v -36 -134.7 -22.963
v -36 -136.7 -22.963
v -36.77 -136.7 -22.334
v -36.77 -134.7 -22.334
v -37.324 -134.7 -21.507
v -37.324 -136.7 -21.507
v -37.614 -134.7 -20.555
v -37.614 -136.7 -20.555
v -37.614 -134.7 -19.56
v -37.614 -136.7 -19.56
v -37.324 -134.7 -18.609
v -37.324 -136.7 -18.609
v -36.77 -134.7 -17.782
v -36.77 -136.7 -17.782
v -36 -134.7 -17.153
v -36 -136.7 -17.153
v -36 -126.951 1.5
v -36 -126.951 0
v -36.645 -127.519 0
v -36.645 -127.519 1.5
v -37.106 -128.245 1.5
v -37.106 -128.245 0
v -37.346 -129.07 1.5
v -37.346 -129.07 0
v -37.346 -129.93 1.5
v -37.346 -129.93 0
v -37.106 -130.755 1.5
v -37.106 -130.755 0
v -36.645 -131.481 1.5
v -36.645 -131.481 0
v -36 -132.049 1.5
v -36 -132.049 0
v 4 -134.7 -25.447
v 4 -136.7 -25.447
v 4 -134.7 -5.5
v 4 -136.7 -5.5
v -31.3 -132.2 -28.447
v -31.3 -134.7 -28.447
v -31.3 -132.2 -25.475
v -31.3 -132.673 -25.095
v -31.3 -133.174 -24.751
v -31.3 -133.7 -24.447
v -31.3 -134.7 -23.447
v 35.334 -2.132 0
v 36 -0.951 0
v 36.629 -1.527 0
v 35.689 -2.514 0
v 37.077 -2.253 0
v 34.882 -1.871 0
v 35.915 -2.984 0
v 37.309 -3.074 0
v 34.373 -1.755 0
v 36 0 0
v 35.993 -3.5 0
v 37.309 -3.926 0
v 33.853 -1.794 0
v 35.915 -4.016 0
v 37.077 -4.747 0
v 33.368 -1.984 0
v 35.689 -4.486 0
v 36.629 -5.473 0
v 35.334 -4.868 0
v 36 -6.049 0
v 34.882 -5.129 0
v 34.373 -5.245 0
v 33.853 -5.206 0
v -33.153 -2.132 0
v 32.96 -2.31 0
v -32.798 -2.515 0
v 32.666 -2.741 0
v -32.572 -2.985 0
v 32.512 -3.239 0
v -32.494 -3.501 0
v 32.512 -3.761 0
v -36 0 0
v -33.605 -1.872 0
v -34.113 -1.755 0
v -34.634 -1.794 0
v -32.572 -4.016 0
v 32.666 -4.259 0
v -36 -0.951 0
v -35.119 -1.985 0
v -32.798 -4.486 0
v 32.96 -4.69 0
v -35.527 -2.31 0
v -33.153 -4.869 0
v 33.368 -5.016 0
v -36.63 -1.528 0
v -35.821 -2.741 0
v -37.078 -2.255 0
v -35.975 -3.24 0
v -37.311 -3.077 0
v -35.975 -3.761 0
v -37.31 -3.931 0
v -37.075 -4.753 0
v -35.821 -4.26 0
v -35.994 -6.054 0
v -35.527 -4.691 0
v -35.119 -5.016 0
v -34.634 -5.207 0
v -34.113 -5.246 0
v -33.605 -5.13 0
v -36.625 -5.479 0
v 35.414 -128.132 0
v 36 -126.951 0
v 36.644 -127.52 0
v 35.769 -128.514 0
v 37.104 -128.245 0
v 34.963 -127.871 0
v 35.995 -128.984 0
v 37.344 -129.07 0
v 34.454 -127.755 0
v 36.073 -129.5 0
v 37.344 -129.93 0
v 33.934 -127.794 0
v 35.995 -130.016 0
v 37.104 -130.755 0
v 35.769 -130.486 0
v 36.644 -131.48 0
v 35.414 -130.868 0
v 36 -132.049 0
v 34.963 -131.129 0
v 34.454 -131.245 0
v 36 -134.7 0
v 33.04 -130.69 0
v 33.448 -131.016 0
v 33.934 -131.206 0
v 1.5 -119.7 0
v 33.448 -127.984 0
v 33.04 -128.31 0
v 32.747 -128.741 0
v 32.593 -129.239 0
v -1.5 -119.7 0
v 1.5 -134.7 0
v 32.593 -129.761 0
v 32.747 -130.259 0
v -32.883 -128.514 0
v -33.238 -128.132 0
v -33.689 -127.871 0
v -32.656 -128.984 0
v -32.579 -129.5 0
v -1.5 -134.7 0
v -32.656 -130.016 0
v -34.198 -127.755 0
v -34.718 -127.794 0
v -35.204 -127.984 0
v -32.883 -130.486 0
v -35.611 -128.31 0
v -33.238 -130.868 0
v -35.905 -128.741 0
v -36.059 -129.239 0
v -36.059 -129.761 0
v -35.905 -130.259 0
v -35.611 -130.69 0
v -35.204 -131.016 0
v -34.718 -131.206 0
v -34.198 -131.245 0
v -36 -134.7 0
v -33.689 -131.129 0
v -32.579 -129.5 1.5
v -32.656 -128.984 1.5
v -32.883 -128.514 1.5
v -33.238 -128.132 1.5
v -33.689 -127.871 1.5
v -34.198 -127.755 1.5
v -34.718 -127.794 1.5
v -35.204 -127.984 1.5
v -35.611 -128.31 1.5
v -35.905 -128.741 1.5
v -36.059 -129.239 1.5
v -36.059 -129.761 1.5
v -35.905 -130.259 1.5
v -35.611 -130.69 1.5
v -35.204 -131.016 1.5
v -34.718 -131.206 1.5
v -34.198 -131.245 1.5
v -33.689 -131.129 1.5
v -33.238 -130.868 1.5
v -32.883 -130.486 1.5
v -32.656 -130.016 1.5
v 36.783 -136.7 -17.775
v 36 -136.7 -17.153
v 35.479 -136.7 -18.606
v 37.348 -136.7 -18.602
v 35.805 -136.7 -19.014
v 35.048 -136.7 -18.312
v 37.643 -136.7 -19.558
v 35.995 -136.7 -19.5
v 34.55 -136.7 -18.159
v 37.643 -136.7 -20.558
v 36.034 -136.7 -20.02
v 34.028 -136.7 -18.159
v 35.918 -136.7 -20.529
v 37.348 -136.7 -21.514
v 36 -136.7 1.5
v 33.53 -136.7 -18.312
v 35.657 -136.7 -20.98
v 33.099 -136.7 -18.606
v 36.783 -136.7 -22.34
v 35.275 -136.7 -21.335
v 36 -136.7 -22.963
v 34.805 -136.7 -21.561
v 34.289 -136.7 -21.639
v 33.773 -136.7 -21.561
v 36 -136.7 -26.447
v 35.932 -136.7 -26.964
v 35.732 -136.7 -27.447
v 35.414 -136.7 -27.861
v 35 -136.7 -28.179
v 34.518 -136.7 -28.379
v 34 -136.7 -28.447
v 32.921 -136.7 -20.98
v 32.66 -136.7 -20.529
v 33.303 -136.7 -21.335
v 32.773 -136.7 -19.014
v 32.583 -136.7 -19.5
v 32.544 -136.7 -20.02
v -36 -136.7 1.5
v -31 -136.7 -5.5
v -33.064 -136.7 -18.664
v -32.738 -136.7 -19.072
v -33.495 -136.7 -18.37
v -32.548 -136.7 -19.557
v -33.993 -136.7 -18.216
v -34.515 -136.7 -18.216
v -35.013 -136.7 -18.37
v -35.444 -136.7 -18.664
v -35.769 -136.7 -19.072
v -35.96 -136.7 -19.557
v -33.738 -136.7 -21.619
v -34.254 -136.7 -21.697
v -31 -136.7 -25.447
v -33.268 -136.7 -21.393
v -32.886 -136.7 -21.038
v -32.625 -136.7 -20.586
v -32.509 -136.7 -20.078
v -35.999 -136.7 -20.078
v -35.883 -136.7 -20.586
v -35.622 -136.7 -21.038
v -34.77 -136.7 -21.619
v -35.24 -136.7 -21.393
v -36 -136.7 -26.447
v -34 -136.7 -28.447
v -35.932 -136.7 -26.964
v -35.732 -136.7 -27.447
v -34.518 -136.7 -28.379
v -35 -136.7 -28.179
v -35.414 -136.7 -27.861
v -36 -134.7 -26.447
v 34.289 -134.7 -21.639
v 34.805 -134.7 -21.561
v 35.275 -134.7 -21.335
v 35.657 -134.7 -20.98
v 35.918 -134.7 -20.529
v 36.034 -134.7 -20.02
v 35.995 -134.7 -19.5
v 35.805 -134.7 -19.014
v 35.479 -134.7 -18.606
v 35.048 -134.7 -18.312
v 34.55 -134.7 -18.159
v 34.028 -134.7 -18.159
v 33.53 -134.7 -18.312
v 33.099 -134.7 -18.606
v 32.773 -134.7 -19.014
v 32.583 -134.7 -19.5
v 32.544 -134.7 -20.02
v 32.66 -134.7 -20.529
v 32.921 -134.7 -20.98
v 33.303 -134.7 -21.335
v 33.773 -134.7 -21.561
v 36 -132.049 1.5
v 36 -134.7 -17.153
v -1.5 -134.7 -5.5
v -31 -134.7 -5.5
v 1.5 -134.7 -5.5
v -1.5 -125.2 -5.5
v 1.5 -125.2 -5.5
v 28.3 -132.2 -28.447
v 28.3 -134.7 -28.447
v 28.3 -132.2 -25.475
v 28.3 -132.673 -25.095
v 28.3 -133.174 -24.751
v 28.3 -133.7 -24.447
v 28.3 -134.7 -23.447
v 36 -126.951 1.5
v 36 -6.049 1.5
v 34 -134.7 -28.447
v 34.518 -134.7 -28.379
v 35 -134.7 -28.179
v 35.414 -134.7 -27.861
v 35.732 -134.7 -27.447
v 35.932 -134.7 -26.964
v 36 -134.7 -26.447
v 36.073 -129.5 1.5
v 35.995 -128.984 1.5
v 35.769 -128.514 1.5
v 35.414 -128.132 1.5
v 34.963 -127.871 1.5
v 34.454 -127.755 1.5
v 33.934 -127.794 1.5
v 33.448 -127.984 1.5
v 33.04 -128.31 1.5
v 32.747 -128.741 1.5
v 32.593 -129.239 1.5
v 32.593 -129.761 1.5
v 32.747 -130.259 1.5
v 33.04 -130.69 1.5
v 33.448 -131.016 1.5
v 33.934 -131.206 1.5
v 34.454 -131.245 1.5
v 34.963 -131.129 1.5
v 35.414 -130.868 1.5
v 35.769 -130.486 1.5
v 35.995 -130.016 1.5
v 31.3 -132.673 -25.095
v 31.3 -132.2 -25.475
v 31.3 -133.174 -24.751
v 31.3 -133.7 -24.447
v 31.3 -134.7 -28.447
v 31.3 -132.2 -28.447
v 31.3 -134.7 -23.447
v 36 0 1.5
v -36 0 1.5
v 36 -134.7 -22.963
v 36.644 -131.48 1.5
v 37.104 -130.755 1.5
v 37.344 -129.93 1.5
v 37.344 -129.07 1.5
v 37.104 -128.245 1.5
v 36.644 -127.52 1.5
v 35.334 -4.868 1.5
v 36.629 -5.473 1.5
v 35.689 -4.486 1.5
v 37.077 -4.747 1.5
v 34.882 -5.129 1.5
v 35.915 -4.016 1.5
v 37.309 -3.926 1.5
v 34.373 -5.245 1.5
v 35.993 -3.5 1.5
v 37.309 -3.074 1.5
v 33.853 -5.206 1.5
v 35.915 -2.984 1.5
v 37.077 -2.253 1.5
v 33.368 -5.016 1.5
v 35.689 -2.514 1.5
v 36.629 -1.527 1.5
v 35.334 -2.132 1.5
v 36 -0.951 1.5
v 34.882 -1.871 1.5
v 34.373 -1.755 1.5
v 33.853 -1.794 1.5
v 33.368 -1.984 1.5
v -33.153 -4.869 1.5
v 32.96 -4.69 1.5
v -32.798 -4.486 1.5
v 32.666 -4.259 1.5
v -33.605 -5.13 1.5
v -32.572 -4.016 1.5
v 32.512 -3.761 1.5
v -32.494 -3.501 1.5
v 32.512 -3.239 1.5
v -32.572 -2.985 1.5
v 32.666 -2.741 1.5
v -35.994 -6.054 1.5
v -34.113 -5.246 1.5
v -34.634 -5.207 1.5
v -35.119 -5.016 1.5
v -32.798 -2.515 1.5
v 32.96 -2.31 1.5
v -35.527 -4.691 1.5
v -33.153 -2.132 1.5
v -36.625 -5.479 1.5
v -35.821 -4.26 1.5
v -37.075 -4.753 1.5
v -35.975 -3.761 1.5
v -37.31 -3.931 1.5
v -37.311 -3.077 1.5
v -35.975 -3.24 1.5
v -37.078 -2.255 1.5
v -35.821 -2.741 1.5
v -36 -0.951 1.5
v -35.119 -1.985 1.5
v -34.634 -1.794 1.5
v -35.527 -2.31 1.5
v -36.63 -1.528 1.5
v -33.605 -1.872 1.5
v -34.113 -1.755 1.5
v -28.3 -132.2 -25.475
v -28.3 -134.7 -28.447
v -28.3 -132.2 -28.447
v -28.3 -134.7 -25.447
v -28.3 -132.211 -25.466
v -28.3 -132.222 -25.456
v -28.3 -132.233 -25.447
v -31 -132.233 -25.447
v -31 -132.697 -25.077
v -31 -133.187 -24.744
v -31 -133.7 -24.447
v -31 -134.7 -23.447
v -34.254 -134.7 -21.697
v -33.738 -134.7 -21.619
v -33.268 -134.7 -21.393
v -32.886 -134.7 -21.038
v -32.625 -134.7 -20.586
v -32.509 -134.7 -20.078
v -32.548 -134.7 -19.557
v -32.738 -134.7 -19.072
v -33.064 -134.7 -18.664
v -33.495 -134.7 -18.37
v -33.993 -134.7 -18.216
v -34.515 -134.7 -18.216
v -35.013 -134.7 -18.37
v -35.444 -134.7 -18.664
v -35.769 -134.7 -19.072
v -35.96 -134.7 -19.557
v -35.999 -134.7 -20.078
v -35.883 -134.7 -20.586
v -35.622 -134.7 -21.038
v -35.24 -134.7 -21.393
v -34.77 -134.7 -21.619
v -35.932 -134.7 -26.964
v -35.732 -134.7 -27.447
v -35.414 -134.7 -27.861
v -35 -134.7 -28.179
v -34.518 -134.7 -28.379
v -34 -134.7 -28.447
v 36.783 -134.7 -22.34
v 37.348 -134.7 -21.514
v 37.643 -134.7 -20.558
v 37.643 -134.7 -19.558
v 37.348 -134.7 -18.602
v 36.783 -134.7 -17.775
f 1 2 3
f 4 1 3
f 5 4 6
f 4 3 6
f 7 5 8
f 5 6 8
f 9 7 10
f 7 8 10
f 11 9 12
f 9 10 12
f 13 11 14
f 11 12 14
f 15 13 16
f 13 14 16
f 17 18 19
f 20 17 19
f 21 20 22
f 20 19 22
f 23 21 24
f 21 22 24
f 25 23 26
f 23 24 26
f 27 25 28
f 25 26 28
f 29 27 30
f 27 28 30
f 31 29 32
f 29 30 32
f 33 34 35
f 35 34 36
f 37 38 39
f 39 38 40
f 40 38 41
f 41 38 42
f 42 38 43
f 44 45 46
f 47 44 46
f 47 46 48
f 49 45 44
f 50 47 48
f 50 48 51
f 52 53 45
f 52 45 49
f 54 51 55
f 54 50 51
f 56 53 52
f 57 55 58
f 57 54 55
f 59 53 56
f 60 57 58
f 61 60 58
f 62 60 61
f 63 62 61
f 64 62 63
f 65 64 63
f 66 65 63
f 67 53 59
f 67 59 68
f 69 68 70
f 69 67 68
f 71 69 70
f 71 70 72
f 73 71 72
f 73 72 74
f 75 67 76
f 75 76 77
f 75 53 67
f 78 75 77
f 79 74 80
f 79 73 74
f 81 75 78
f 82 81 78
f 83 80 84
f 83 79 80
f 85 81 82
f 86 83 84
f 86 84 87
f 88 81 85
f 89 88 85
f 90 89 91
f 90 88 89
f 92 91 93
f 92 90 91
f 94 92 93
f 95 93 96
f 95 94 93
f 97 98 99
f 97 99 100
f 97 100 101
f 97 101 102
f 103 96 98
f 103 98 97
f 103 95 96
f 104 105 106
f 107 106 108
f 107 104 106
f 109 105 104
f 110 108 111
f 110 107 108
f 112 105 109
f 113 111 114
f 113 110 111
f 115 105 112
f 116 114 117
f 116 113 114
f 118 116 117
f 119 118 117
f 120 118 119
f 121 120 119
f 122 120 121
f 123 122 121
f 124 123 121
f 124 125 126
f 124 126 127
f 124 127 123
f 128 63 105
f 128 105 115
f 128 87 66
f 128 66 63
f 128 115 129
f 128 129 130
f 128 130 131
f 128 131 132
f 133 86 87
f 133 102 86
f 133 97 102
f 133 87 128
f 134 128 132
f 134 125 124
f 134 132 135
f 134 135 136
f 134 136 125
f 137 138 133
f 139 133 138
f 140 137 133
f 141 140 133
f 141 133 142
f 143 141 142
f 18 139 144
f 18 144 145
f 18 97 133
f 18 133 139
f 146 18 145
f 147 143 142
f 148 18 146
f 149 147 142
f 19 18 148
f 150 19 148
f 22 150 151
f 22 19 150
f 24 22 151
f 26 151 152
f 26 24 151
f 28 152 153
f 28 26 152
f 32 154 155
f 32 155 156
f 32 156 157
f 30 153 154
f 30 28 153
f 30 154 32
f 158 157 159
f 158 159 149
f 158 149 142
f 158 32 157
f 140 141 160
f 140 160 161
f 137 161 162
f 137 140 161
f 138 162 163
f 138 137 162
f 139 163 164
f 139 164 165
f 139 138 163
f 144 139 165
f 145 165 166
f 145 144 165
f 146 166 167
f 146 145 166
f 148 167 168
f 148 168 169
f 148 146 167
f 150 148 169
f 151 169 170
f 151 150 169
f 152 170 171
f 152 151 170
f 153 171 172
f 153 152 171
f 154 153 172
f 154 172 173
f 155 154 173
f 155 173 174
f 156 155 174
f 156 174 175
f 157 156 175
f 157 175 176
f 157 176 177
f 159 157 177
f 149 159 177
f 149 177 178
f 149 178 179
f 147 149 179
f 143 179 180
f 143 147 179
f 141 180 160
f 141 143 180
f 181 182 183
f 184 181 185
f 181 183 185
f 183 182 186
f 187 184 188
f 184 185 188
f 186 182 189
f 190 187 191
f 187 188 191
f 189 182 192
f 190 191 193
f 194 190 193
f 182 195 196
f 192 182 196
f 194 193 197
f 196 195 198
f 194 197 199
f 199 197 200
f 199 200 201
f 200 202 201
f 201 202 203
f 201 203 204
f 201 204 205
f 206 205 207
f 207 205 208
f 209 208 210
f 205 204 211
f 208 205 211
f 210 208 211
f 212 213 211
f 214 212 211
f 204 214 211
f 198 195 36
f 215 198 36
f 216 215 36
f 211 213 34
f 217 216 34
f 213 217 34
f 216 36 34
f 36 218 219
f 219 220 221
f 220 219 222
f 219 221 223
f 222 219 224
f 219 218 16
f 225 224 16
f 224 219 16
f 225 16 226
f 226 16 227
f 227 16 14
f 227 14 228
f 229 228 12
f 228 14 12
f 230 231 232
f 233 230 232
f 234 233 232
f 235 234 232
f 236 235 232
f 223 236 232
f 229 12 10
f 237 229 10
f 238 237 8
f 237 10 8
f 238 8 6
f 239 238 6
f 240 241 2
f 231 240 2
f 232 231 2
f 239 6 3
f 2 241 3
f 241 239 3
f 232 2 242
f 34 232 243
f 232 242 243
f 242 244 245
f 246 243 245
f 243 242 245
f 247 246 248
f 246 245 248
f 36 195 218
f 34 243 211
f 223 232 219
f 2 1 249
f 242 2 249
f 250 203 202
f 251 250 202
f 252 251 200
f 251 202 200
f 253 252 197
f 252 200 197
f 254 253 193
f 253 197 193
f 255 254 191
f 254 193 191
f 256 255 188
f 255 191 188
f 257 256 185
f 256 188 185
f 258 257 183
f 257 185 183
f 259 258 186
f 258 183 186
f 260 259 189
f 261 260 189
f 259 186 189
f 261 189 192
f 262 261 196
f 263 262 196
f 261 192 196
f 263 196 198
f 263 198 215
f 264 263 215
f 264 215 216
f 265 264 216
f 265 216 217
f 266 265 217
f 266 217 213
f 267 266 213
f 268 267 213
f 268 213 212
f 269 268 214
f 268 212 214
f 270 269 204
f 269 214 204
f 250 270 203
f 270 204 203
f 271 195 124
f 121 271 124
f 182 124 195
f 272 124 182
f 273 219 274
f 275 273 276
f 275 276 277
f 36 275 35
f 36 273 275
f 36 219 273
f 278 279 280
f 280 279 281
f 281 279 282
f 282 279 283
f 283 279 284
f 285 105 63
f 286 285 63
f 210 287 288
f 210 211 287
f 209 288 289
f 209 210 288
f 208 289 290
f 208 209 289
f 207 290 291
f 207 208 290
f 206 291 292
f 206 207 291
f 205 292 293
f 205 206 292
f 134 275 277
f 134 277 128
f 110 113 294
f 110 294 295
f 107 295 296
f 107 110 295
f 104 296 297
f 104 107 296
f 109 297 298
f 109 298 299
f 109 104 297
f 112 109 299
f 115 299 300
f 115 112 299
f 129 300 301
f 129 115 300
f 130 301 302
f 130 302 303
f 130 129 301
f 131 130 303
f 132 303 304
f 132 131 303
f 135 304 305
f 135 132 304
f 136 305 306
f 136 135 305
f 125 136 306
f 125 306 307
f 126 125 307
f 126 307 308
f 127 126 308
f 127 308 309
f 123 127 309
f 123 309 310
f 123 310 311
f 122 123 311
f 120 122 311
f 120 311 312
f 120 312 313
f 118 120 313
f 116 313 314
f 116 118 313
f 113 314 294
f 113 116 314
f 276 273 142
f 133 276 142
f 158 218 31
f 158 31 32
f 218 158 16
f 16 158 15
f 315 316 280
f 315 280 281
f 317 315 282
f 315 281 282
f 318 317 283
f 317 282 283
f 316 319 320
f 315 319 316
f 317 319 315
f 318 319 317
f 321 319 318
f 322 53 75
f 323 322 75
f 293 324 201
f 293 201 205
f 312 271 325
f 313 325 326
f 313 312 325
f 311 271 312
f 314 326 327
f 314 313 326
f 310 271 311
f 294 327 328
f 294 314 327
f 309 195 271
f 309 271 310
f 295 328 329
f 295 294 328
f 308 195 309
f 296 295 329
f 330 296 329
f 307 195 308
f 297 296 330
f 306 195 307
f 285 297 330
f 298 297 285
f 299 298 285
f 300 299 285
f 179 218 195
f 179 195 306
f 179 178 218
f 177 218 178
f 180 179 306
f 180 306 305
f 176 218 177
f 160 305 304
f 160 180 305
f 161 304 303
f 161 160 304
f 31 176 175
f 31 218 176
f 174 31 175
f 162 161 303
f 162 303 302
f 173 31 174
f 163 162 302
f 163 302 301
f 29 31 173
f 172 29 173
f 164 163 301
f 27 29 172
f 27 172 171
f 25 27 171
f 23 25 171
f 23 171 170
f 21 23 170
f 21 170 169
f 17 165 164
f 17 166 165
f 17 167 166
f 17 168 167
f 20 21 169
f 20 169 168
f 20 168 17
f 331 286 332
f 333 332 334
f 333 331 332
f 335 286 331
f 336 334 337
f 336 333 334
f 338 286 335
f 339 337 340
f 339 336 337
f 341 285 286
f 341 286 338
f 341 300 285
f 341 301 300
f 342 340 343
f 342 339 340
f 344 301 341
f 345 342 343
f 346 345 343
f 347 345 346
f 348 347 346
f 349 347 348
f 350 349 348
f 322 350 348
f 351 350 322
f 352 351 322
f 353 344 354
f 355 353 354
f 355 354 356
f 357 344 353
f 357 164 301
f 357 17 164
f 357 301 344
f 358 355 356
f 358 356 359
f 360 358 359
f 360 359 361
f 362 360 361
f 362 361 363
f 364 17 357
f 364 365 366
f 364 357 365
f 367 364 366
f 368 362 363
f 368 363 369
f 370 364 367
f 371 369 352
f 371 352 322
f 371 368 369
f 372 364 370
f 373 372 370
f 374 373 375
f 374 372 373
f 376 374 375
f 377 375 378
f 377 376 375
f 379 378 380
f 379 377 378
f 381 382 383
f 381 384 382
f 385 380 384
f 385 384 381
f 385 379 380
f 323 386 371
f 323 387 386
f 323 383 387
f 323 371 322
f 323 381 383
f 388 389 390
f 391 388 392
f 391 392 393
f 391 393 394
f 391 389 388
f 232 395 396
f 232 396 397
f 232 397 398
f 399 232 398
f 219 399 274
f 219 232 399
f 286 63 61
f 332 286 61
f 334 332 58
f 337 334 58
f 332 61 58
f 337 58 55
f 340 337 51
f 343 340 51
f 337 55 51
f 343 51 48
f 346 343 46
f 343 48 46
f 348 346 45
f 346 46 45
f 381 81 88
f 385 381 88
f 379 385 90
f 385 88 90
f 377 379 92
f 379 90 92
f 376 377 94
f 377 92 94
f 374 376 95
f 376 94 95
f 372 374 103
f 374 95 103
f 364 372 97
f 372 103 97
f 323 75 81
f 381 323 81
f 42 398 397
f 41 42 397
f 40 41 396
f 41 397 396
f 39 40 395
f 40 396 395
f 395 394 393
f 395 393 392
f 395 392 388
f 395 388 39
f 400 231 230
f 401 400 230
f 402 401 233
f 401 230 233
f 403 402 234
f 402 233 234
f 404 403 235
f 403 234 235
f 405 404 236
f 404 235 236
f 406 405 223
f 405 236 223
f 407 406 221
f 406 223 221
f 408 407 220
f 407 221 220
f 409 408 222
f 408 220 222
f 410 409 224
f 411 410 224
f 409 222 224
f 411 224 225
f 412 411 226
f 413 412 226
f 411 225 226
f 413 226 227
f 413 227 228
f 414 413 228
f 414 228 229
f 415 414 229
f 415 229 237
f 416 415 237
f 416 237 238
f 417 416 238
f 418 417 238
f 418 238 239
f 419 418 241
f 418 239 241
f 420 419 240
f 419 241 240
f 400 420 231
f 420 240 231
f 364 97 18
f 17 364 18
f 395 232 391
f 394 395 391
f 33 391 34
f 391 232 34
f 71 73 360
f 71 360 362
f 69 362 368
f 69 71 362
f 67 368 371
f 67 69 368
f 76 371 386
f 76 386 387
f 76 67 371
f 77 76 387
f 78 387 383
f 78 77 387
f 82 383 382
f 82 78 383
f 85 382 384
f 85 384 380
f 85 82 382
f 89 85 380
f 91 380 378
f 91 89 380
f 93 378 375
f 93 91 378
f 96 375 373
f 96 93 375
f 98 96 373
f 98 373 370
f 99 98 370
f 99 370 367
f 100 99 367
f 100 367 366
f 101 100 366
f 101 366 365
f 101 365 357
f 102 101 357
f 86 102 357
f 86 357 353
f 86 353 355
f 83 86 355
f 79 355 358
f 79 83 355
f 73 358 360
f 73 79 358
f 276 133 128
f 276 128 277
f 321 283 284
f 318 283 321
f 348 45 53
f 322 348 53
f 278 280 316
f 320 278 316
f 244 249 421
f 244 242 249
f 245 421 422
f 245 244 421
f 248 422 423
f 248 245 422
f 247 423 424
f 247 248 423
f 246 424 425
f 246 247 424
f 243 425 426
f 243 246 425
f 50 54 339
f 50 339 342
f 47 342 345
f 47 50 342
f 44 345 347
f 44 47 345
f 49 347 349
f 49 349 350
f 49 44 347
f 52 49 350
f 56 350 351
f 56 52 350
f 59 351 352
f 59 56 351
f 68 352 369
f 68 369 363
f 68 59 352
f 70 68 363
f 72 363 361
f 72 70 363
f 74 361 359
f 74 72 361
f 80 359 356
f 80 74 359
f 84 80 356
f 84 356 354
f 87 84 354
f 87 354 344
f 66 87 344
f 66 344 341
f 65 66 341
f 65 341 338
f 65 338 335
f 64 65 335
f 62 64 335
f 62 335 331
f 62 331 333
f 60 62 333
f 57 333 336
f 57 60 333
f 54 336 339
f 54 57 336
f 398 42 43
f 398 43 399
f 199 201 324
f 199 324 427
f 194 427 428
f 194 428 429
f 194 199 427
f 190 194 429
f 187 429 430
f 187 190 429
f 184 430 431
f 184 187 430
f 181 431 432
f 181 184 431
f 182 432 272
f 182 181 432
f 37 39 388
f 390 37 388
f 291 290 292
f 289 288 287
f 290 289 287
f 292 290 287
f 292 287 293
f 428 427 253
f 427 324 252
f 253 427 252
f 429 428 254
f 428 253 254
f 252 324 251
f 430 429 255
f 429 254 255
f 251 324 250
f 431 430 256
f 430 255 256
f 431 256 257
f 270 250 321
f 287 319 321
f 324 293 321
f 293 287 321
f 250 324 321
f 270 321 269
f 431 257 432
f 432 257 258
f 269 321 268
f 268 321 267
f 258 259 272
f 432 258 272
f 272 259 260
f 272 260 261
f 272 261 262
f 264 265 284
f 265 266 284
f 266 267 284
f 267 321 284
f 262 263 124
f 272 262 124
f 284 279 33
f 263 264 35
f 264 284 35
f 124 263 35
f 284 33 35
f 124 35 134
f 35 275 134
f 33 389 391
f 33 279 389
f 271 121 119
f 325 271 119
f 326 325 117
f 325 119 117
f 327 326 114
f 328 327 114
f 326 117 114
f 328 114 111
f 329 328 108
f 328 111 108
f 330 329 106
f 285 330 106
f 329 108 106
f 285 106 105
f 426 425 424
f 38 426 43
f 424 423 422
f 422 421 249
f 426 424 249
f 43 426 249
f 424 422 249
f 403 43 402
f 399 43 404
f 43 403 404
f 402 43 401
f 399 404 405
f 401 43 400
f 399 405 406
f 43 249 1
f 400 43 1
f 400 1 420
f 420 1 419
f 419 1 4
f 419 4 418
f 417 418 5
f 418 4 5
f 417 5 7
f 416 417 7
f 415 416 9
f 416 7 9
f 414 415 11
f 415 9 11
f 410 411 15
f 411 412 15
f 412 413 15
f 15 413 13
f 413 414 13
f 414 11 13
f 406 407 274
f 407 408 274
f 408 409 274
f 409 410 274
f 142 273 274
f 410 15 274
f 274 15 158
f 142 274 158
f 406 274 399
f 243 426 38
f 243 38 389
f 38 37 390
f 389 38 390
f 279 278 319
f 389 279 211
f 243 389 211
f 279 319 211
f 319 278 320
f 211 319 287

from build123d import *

# Parameters (mm, degrees)
SKETCH1_R                = 1.75
BOSS_EXTRUDE1_DEPTH      = 1.5
BOSS_EXTRUDE2_DEPTH      = 72
BOSS_EXTRUDE3_DEPTH      = 1.5
BOSS_EXTRUDE3_DEPTH_BACK = 1.5
BOSS_EXTRUDE4_DEPTH      = 2
SKETCH5_R                = 1.75
CUT_EXTRUDE1_DEPTH       = 2
CUT_EXTRUDE2_DEPTH       = 148.332054879
CUT_EXTRUDE2_DEPTH_BACK  = 148.332054879
SKETCH6_W                = 72
SKETCH6_H                = 11.553195909
BOSS_EXTRUDE6_START      = -2
SKETCH7_W                = 3
SKETCH7_H                = 4
BOSS_EXTRUDE6_DEPTH      = 2.5
FILLET1_R                = 2
CHAMFER1_SIZE            = 1
FILLET2_R                = 8
SKETCH8_W                = 35
SKETCH8_H                = 19.946804091
CUT_EXTRUDE3_DEPTH       = 22.4262221


with BuildPart() as part:
    # Sketch1 → Boss-Extrude1 (new body)
    with BuildSketch(Plane.XY):
        with BuildLine():
            Line((-31.5, -134.5), (31.5, -134.5))
            Line((31.5, -134.5), (36, -134.5))
            Line((36, -134.5), (36, -132.049019419))
            ThreePointArc((36, -132.049019419), (37.374296294, -129.5), (36, -126.950980581))
            Line((36, -126.950980581), (36, -6.049019419))
            ThreePointArc((36, -6.049019419), (37.33874188, -3.5), (36, -0.950980581))
            Line((36, -0.950980581), (36, 0))
            Line((36, 0), (-36, 0))
            Line((-36, 0), (-36, -0.950980581))
            ThreePointArc((-36, -0.950980581), (-37.339851511, -3.504206195), (-35.994020506, -6.054285021))
            Line((-35.994020506, -6.054285021), (-36, -126.950980581))
            ThreePointArc((-36, -126.950980581), (-37.376731289, -129.5), (-36, -132.049019419))
            Line((-36, -132.049019419), (-36, -134.5))
            Line((-36, -134.5), (-31.5, -134.5))
        make_face()
        with Locations((-34.328609587, -129.5)):
            Circle(SKETCH1_R, mode=Mode.SUBTRACT)
        with Locations((34.323211043, -129.5)):
            Circle(SKETCH1_R, mode=Mode.SUBTRACT)
        with Locations((34.242652207, -3.5)):
            Circle(SKETCH1_R, mode=Mode.SUBTRACT)
        with Locations((-34.244120111, -3.500578956)):
            Circle(SKETCH1_R, mode=Mode.SUBTRACT)
    extrude(amount=BOSS_EXTRUDE1_DEPTH)

    # Sketch2 → Boss-Extrude2 (add)
    with BuildSketch(Plane.ZY.offset(36)):
        Polygon((1.5, -134.5), (1.5, -136.7), (-40, -136.7), (-40, -134.7), (0, -134.7), (0, -134.5), (0, -132.049019419), (1.5, -132.049019419), align=None)
    extrude(amount=-BOSS_EXTRUDE2_DEPTH)

    # Sketch3 → Boss-Extrude3 (add, two sides: drawn at the far end of the back side and taken through both)
    with BuildSketch(Plane(origin=(0, 0, 0), x_dir=(0, 0, -1), z_dir=(1, 0, 0)).offset(-BOSS_EXTRUDE3_DEPTH_BACK)):
        Polygon((0, -119.7), (15, -134.7), (0, -134.7), align=None)
    extrude(amount=BOSS_EXTRUDE3_DEPTH + BOSS_EXTRUDE3_DEPTH_BACK)

    # Sketch4 → Boss-Extrude4 (add)
    with BuildSketch(Plane.XZ.offset(136.7)):
        with BuildLine():
            Line((-36, -17.152805247), (-36, -22.963011674))
            ThreePointArc((-36, -22.963011674), (-37.650416645, -20.05790846), (-36, -17.152805247))
        make_face()
        with BuildLine():
            Line((36, -17.152805247), (36, -22.963011674))
            ThreePointArc((36, -22.963011674), (37.68082264, -20.05790846), (36, -17.152805247))
        make_face()
    extrude(amount=-BOSS_EXTRUDE4_DEPTH)

    # Sketch5 → Cut-Extrude1 (cut)
    with BuildSketch(Plane.XZ.offset(136.7)):
        with Locations(Location((-34.253947115, -19.946804091, 0), (0, 0, 270))):
            Circle(SKETCH5_R)
        with Locations(Location((34.288977705, -19.889159472, 0), (0, 0, 270))):
            Circle(SKETCH5_R)
    extrude(amount=-CUT_EXTRUDE1_DEPTH, mode=Mode.SUBTRACT)

    # Sketch6 → Cut-Extrude2 (cut, two sides: drawn at the far end of the back side and taken through both)
    with BuildSketch(Plane.XZ.offset(136.7).offset(-CUT_EXTRUDE2_DEPTH_BACK)):
        with Locations((0, -34.223402046)):
            Rectangle(SKETCH6_W, SKETCH6_H)
    extrude(amount=CUT_EXTRUDE2_DEPTH + CUT_EXTRUDE2_DEPTH_BACK, mode=Mode.SUBTRACT)

    # Sketch7 → Boss-Extrude6 (add)
    with BuildSketch(Plane.XZ.offset(136.7).offset(BOSS_EXTRUDE6_START)):
        with Locations((-29.8, -26.446804091)):
            Rectangle(SKETCH7_W, SKETCH7_H)
        with Locations((29.8, -26.446804091)):
            Rectangle(SKETCH7_W, SKETCH7_H)
    extrude(amount=-BOSS_EXTRUDE6_DEPTH)

    # Fillet1
    fillet1_edges = [part.edges().sort_by_distance(p)[0] for p in [
        (36, -135.7, -28.446804091),
        (-36, -135.7, -28.446804091),
    ]]
    fillet(fillet1_edges, radius=FILLET1_R)

    # Chamfer1
    chamfer1_edges = [part.edges().sort_by_distance(p)[0] for p in [
        (-29.8, -134.7, -24.446804091),
        (-29.8, -132.2, -24.446804091),
        (29.8, -134.7, -24.446804091),
        (29.8, -132.2, -24.446804091),
    ]]
    chamfer(chamfer1_edges, length=CHAMFER1_SIZE)

    # Fillet2
    # the kernel refuses this fillet: 8 mm, written as the material it takes off along each edge
    with BuildSketch(Plane(origin=(-23.303909917, -133.2, -24.446804091), x_dir=(0, -1.0, -1.118394266079786e-11), z_dir=(-1, 0, 0))) as fillet2_piece_1:
        with BuildLine():
            CenterArc((4.243746579, -7.06996192), FILLET2_R, 117.902496562, 17.097503438)
            Line((-1.413107671, -1.413107671), (0, 0))
            Line((0, 0), (0.5, 0))
        make_face()
    extrude(amount=12.992180166, mode=Mode.SUBTRACT)
    with BuildSketch(Plane(origin=(23.303909917, -133.2, -24.446804091), x_dir=(0, 0.7071067811865476, -0.7071067811865476), z_dir=(1, 0, 0))) as fillet2_piece_2:
        with BuildLine():
            CenterArc((1.998436033, -8), FILLET2_R, 90, 17.097503438)
            Line((-0.353553391, -0.353553391), (0, 0))
            Line((0, 0), (1.998436033, 0))
        make_face()
    extrude(amount=12.992180166, mode=Mode.SUBTRACT)

    # Sketch8 → Cut-Extrude3 (cut)
    with BuildSketch(Plane.XZ.offset(136.7)):
        with Locations((-13.5, -15.473402046)):
            Rectangle(SKETCH8_W, SKETCH8_H)
    extrude(amount=-CUT_EXTRUDE3_DEPTH, mode=Mode.SUBTRACT)


solid = part.part
